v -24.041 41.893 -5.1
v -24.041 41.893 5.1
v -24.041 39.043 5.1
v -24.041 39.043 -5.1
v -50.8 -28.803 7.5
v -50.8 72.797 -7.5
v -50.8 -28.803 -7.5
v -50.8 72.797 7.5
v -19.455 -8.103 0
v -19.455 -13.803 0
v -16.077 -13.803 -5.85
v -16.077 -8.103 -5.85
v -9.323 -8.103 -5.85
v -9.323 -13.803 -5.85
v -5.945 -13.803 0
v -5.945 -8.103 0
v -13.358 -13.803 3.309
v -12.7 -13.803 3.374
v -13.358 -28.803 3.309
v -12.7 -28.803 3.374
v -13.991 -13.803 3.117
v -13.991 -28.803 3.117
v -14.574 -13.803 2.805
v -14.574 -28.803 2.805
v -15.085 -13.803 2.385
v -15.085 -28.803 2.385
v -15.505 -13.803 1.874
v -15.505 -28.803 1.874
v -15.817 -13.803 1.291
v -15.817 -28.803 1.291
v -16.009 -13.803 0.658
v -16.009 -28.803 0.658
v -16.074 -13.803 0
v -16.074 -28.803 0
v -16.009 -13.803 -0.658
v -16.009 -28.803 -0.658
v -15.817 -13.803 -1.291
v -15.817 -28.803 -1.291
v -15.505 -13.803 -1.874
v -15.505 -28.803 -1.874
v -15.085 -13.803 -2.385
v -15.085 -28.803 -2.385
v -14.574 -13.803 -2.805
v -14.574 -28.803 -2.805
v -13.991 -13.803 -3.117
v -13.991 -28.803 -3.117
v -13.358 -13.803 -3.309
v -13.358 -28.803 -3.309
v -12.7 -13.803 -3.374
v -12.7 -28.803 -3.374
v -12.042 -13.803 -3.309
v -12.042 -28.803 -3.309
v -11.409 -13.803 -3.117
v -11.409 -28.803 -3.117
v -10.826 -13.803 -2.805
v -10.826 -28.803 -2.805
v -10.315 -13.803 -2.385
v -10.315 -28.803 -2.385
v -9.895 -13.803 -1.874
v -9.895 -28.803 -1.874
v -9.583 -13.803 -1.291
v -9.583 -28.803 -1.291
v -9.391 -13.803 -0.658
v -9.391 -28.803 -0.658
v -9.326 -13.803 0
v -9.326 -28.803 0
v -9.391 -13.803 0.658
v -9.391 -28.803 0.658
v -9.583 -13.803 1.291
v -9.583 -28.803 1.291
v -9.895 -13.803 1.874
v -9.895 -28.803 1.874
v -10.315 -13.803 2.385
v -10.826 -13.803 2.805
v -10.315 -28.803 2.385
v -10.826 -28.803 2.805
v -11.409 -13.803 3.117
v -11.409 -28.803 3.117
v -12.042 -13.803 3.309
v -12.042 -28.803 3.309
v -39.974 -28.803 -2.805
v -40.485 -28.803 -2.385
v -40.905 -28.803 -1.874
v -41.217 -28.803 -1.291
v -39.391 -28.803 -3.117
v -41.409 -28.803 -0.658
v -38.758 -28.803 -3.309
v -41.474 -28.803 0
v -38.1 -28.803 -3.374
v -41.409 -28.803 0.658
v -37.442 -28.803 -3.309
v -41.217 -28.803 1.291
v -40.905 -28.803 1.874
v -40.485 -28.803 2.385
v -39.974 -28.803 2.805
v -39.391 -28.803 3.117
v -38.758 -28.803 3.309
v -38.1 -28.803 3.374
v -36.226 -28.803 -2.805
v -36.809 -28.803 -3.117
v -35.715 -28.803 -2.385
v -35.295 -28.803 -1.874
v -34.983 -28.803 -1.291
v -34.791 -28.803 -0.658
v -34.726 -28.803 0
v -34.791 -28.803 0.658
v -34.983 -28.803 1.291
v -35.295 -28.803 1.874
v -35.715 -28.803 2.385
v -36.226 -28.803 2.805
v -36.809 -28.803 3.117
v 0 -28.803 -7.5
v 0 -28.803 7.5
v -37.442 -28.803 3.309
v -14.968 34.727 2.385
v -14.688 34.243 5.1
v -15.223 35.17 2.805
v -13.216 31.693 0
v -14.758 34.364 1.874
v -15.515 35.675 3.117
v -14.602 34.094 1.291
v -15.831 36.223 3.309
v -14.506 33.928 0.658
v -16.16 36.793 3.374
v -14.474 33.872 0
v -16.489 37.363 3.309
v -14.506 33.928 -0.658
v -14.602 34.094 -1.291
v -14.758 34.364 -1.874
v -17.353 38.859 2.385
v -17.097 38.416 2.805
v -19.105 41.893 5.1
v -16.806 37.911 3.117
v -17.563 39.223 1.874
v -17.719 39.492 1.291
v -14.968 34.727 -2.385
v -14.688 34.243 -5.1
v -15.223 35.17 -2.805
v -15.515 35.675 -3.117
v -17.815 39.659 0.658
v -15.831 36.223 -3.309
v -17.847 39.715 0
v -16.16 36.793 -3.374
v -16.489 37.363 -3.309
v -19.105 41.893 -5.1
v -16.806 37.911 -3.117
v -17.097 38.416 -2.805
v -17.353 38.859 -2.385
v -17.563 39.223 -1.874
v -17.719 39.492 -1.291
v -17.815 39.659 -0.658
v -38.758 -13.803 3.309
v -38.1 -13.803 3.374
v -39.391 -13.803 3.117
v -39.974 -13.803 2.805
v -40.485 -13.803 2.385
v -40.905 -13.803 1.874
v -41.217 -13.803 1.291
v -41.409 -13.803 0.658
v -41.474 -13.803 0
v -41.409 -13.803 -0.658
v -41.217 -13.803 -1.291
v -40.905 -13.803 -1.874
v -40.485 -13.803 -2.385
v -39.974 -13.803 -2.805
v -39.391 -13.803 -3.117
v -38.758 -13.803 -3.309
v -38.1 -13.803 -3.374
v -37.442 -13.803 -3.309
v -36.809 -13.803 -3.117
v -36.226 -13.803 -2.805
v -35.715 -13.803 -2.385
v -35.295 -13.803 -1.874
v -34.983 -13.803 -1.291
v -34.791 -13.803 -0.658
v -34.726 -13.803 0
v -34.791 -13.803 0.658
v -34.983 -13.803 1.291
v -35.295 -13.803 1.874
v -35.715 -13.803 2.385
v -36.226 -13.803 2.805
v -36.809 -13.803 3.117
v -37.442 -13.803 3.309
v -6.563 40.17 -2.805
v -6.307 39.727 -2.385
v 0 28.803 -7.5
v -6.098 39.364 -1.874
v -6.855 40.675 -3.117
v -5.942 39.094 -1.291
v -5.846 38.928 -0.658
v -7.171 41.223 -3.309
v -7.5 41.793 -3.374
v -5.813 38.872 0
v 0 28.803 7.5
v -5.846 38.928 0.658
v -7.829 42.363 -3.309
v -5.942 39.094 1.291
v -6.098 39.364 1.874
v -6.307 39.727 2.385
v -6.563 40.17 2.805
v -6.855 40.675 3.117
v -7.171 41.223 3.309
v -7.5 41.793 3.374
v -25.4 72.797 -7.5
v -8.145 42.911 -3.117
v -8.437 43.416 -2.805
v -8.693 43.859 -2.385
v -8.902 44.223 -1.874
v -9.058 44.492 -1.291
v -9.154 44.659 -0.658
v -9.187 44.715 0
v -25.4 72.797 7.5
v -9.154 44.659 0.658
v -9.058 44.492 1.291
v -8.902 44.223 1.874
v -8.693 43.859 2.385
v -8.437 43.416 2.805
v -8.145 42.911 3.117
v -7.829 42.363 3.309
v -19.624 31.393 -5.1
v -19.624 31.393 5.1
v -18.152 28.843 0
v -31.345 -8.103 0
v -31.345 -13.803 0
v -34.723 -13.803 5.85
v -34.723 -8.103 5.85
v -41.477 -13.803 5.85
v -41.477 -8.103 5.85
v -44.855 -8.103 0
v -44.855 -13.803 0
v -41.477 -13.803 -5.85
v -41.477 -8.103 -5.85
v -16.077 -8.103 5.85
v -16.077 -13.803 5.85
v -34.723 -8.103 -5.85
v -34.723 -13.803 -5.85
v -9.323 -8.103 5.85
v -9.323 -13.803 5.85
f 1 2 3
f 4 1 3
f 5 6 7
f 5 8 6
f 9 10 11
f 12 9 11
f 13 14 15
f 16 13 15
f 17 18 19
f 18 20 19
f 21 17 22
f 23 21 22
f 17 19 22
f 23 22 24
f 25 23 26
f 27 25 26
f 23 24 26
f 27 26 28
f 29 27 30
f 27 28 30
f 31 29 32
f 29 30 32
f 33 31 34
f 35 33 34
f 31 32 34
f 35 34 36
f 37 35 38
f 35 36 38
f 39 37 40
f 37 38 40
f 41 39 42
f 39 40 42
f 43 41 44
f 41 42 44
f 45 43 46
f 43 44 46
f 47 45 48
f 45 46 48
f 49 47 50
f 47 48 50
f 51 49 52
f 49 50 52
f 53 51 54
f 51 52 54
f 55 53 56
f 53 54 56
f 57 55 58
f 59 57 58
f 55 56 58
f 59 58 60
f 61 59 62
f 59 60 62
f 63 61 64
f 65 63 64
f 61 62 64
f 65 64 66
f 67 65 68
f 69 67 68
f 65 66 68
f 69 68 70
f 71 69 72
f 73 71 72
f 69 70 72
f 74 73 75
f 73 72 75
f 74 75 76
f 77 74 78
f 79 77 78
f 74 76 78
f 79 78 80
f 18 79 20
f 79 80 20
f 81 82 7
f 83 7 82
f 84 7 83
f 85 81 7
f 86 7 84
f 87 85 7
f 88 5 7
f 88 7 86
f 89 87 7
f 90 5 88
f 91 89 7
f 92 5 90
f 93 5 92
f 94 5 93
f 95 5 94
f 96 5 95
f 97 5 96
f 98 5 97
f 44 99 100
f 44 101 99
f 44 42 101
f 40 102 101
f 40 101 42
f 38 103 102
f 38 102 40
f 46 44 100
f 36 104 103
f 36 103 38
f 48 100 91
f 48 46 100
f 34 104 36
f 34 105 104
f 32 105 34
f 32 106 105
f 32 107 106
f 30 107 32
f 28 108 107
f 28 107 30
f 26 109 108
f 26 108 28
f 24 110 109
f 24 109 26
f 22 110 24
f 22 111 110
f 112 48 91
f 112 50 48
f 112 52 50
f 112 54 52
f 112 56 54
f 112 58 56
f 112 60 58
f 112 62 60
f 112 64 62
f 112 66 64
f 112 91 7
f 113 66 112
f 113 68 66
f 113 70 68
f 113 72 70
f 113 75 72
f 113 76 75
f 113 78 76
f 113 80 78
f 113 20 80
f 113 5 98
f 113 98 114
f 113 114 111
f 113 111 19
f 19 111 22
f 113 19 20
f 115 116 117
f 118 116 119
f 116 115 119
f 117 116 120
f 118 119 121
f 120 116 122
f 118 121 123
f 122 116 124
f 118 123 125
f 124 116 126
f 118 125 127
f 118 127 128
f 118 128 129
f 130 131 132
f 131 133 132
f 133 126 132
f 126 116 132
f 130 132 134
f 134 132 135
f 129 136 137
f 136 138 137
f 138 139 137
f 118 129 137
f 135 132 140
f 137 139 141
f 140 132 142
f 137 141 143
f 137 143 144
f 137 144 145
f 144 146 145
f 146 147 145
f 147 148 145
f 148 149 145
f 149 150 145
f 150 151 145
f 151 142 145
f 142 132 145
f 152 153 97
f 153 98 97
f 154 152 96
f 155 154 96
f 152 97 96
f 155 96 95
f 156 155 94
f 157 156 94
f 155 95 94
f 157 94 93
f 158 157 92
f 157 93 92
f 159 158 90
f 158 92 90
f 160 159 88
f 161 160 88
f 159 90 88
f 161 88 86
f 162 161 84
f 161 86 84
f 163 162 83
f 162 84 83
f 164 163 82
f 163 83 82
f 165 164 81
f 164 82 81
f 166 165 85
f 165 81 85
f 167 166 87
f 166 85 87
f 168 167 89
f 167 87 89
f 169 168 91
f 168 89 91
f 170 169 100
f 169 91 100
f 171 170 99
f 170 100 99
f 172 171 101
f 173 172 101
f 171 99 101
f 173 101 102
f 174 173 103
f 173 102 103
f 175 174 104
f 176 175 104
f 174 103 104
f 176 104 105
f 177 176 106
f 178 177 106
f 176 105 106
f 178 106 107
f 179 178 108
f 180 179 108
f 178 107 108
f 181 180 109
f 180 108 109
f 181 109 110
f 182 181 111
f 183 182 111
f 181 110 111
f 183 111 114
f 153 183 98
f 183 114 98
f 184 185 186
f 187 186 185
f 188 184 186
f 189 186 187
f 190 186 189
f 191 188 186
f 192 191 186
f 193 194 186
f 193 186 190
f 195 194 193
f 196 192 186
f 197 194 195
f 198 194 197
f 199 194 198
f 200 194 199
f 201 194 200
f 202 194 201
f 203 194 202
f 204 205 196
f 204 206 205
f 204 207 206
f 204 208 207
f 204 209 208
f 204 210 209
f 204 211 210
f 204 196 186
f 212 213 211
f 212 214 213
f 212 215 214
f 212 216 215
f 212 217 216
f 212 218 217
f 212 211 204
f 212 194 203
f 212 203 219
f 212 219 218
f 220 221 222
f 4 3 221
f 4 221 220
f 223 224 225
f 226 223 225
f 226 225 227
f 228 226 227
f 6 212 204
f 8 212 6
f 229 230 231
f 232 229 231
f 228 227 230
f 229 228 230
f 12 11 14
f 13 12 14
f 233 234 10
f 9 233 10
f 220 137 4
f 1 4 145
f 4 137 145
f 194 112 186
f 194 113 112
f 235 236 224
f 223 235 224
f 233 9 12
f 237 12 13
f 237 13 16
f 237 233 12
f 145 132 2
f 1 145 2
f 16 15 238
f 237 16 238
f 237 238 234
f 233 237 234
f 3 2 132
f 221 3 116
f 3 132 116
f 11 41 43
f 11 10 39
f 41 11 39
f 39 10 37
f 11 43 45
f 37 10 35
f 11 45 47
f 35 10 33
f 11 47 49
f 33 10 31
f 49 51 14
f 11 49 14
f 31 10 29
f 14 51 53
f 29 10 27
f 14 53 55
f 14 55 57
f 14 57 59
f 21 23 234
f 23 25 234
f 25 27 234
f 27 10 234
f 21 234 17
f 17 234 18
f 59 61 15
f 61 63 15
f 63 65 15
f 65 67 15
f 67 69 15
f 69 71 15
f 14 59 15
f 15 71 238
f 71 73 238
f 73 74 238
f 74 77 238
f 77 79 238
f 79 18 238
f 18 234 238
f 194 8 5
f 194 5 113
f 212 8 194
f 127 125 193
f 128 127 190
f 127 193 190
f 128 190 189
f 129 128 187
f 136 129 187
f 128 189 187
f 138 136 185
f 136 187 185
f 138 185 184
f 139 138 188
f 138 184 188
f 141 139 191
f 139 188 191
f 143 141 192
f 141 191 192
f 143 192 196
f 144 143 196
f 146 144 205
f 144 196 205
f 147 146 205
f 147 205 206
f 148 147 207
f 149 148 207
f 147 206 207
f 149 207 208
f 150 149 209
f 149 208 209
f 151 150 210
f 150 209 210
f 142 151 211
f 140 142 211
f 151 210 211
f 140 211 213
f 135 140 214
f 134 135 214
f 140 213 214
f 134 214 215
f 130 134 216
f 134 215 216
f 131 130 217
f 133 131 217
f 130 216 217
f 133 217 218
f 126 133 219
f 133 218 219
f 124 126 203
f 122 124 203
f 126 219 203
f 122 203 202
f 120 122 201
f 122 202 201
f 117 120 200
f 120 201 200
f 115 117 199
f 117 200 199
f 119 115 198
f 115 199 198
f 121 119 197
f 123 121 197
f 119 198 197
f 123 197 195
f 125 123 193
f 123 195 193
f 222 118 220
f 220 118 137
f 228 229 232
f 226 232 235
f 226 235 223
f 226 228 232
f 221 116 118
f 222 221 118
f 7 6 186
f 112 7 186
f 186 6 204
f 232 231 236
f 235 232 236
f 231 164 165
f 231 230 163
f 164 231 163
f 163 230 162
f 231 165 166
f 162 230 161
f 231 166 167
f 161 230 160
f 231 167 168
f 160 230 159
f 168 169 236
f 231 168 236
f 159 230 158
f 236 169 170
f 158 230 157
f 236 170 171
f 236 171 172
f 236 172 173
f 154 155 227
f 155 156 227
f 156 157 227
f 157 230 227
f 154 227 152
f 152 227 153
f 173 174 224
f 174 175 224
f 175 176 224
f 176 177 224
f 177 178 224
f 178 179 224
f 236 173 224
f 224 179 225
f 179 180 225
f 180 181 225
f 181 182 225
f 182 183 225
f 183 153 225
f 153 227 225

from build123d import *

# Parameters (mm, degrees)
BOSS_EXTRUDE1_DEPTH                       = 7.5
CUT_EXTRUDE1_START                        = -10
CUT_EXTRUDE1_DEPTH                        = 5.7
SKETCH5_W                                 = 3.373501
SKETCH5_H                                 = 31.997045256
CUT_EXTRUDE2_START                        = -15
CUT_EXTRUDE2_DEPTH                        = 5.7
SKETCH8_W                                 = 3.373501
SKETCH8_H                                 = 15
F_17_64_0_26563_DIAMETER_HOLE2_AT_2_COUNT = 2
F_17_64_0_26563_DIAMETER_HOLE2_AT_2_PITCH = 25.4
CUT_EXTRUDE3_DEPTH                        = 10.2


with BuildPart() as part:
    # Sketch1 → Boss-Extrude1 (new, symmetric)
    with BuildSketch(Plane.XY):
        Polygon((0, -28.802954744), (0, 28.802954744), (-25.4, 72.797045256), (-50.8, 72.797045256), (-50.8, -28.802954744), (-25.4, -28.802954744), align=None)
    extrude(amount=BOSS_EXTRUDE1_DEPTH, both=True)

    # Sketch2 → Cut-Extrude1 (cut)
    with BuildSketch(Plane(origin=(12.472045256, 7.200738686, 0), x_dir=(0, 0, -1), z_dir=(0.8660254037844379, 0.5000000000000013, 0)).offset(CUT_EXTRUDE1_START)):
        Polygon((0, 34.055117767), (5.1, 36.999604139), (5.1, 42.888576885), (5.1, 45.833063258), (0, 45.833063258), (-5.1, 45.833063258), (-5.1, 42.888576885), (-5.1, 36.999604139), align=None)
    extrude(amount=-CUT_EXTRUDE1_DEPTH, mode=Mode.SUBTRACT)

    # Sketch5 → 17/64 (0.26563) Diameter Hole1 (revolve, cut)
    with BuildSketch(Plane(origin=(-16.160254038, 36.793335801, 0), x_dir=(0.500000000000001, -0.866025403784438, 0), z_dir=(0, 0, 1))):
        with Locations((1.6867505, 15.998522628)):
            Rectangle(SKETCH5_W, SKETCH5_H)
    revolve(axis=Axis((-21.659515352, 33.618335801, 0), (0.866025403784438, 0.5000000000000009, 0)), mode=Mode.SUBTRACT)

    # Sketch6 → Cut-Extrude2 (cut)
    with BuildSketch(Plane.XZ.offset(28.802954744).offset(CUT_EXTRUDE2_START)):
        Polygon((-31.34500185, 0), (-34.722500925, 5.85), (-41.477499075, 5.85), (-44.85499815, 0), (-41.477499075, -5.85), (-34.722500925, -5.85), align=None)
        Polygon((-9.322500925, 5.85), (-16.077499075, 5.85), (-19.45499815, 0), (-16.077499075, -5.85), (-9.322500925, -5.85), (-5.94500185, 0), align=None)
    extrude(amount=-CUT_EXTRUDE2_DEPTH, mode=Mode.SUBTRACT)

    # Sketch8 → 17/64 (0.26563) Diameter Hole2 (revolve, cut)
    with BuildSketch(Plane(origin=(-12.7, -13.802954744, 0), x_dir=(0, 0, 1), z_dir=(1, 0, 0))):
        with Locations((1.6867505, 7.5)):
            Rectangle(SKETCH8_W, SKETCH8_H)
    f_17_64_0_26563_diameter_hole2 = revolve(axis=Axis((-12.7, -7.452954744, 0), (0, -1, 0)), mode=Mode.SUBTRACT)

    # 17/64 (0.26563) Diameter Hole2 at 2: 17/64 (0.26563) Diameter Hole2 ×2
    with Locations(*[(-i * F_17_64_0_26563_DIAMETER_HOLE2_AT_2_PITCH, 0, 0) for i in range(1, F_17_64_0_26563_DIAMETER_HOLE2_AT_2_COUNT)]):
        add(f_17_64_0_26563_diameter_hole2, mode=Mode.SUBTRACT)

    # Sketch9 → Cut-Extrude3 (cut)
    with BuildSketch(Plane(origin=(0, 0, 5.1), x_dir=(-1, 0, 0), z_dir=(0, 0, -1))):
        Polygon((19.104740411, 41.893335801), (24.041085212, 41.893335801), (24.041085212, 39.043335801), align=None)
    extrude(amount=CUT_EXTRUDE3_DEPTH, mode=Mode.SUBTRACT)


solid = part.part
